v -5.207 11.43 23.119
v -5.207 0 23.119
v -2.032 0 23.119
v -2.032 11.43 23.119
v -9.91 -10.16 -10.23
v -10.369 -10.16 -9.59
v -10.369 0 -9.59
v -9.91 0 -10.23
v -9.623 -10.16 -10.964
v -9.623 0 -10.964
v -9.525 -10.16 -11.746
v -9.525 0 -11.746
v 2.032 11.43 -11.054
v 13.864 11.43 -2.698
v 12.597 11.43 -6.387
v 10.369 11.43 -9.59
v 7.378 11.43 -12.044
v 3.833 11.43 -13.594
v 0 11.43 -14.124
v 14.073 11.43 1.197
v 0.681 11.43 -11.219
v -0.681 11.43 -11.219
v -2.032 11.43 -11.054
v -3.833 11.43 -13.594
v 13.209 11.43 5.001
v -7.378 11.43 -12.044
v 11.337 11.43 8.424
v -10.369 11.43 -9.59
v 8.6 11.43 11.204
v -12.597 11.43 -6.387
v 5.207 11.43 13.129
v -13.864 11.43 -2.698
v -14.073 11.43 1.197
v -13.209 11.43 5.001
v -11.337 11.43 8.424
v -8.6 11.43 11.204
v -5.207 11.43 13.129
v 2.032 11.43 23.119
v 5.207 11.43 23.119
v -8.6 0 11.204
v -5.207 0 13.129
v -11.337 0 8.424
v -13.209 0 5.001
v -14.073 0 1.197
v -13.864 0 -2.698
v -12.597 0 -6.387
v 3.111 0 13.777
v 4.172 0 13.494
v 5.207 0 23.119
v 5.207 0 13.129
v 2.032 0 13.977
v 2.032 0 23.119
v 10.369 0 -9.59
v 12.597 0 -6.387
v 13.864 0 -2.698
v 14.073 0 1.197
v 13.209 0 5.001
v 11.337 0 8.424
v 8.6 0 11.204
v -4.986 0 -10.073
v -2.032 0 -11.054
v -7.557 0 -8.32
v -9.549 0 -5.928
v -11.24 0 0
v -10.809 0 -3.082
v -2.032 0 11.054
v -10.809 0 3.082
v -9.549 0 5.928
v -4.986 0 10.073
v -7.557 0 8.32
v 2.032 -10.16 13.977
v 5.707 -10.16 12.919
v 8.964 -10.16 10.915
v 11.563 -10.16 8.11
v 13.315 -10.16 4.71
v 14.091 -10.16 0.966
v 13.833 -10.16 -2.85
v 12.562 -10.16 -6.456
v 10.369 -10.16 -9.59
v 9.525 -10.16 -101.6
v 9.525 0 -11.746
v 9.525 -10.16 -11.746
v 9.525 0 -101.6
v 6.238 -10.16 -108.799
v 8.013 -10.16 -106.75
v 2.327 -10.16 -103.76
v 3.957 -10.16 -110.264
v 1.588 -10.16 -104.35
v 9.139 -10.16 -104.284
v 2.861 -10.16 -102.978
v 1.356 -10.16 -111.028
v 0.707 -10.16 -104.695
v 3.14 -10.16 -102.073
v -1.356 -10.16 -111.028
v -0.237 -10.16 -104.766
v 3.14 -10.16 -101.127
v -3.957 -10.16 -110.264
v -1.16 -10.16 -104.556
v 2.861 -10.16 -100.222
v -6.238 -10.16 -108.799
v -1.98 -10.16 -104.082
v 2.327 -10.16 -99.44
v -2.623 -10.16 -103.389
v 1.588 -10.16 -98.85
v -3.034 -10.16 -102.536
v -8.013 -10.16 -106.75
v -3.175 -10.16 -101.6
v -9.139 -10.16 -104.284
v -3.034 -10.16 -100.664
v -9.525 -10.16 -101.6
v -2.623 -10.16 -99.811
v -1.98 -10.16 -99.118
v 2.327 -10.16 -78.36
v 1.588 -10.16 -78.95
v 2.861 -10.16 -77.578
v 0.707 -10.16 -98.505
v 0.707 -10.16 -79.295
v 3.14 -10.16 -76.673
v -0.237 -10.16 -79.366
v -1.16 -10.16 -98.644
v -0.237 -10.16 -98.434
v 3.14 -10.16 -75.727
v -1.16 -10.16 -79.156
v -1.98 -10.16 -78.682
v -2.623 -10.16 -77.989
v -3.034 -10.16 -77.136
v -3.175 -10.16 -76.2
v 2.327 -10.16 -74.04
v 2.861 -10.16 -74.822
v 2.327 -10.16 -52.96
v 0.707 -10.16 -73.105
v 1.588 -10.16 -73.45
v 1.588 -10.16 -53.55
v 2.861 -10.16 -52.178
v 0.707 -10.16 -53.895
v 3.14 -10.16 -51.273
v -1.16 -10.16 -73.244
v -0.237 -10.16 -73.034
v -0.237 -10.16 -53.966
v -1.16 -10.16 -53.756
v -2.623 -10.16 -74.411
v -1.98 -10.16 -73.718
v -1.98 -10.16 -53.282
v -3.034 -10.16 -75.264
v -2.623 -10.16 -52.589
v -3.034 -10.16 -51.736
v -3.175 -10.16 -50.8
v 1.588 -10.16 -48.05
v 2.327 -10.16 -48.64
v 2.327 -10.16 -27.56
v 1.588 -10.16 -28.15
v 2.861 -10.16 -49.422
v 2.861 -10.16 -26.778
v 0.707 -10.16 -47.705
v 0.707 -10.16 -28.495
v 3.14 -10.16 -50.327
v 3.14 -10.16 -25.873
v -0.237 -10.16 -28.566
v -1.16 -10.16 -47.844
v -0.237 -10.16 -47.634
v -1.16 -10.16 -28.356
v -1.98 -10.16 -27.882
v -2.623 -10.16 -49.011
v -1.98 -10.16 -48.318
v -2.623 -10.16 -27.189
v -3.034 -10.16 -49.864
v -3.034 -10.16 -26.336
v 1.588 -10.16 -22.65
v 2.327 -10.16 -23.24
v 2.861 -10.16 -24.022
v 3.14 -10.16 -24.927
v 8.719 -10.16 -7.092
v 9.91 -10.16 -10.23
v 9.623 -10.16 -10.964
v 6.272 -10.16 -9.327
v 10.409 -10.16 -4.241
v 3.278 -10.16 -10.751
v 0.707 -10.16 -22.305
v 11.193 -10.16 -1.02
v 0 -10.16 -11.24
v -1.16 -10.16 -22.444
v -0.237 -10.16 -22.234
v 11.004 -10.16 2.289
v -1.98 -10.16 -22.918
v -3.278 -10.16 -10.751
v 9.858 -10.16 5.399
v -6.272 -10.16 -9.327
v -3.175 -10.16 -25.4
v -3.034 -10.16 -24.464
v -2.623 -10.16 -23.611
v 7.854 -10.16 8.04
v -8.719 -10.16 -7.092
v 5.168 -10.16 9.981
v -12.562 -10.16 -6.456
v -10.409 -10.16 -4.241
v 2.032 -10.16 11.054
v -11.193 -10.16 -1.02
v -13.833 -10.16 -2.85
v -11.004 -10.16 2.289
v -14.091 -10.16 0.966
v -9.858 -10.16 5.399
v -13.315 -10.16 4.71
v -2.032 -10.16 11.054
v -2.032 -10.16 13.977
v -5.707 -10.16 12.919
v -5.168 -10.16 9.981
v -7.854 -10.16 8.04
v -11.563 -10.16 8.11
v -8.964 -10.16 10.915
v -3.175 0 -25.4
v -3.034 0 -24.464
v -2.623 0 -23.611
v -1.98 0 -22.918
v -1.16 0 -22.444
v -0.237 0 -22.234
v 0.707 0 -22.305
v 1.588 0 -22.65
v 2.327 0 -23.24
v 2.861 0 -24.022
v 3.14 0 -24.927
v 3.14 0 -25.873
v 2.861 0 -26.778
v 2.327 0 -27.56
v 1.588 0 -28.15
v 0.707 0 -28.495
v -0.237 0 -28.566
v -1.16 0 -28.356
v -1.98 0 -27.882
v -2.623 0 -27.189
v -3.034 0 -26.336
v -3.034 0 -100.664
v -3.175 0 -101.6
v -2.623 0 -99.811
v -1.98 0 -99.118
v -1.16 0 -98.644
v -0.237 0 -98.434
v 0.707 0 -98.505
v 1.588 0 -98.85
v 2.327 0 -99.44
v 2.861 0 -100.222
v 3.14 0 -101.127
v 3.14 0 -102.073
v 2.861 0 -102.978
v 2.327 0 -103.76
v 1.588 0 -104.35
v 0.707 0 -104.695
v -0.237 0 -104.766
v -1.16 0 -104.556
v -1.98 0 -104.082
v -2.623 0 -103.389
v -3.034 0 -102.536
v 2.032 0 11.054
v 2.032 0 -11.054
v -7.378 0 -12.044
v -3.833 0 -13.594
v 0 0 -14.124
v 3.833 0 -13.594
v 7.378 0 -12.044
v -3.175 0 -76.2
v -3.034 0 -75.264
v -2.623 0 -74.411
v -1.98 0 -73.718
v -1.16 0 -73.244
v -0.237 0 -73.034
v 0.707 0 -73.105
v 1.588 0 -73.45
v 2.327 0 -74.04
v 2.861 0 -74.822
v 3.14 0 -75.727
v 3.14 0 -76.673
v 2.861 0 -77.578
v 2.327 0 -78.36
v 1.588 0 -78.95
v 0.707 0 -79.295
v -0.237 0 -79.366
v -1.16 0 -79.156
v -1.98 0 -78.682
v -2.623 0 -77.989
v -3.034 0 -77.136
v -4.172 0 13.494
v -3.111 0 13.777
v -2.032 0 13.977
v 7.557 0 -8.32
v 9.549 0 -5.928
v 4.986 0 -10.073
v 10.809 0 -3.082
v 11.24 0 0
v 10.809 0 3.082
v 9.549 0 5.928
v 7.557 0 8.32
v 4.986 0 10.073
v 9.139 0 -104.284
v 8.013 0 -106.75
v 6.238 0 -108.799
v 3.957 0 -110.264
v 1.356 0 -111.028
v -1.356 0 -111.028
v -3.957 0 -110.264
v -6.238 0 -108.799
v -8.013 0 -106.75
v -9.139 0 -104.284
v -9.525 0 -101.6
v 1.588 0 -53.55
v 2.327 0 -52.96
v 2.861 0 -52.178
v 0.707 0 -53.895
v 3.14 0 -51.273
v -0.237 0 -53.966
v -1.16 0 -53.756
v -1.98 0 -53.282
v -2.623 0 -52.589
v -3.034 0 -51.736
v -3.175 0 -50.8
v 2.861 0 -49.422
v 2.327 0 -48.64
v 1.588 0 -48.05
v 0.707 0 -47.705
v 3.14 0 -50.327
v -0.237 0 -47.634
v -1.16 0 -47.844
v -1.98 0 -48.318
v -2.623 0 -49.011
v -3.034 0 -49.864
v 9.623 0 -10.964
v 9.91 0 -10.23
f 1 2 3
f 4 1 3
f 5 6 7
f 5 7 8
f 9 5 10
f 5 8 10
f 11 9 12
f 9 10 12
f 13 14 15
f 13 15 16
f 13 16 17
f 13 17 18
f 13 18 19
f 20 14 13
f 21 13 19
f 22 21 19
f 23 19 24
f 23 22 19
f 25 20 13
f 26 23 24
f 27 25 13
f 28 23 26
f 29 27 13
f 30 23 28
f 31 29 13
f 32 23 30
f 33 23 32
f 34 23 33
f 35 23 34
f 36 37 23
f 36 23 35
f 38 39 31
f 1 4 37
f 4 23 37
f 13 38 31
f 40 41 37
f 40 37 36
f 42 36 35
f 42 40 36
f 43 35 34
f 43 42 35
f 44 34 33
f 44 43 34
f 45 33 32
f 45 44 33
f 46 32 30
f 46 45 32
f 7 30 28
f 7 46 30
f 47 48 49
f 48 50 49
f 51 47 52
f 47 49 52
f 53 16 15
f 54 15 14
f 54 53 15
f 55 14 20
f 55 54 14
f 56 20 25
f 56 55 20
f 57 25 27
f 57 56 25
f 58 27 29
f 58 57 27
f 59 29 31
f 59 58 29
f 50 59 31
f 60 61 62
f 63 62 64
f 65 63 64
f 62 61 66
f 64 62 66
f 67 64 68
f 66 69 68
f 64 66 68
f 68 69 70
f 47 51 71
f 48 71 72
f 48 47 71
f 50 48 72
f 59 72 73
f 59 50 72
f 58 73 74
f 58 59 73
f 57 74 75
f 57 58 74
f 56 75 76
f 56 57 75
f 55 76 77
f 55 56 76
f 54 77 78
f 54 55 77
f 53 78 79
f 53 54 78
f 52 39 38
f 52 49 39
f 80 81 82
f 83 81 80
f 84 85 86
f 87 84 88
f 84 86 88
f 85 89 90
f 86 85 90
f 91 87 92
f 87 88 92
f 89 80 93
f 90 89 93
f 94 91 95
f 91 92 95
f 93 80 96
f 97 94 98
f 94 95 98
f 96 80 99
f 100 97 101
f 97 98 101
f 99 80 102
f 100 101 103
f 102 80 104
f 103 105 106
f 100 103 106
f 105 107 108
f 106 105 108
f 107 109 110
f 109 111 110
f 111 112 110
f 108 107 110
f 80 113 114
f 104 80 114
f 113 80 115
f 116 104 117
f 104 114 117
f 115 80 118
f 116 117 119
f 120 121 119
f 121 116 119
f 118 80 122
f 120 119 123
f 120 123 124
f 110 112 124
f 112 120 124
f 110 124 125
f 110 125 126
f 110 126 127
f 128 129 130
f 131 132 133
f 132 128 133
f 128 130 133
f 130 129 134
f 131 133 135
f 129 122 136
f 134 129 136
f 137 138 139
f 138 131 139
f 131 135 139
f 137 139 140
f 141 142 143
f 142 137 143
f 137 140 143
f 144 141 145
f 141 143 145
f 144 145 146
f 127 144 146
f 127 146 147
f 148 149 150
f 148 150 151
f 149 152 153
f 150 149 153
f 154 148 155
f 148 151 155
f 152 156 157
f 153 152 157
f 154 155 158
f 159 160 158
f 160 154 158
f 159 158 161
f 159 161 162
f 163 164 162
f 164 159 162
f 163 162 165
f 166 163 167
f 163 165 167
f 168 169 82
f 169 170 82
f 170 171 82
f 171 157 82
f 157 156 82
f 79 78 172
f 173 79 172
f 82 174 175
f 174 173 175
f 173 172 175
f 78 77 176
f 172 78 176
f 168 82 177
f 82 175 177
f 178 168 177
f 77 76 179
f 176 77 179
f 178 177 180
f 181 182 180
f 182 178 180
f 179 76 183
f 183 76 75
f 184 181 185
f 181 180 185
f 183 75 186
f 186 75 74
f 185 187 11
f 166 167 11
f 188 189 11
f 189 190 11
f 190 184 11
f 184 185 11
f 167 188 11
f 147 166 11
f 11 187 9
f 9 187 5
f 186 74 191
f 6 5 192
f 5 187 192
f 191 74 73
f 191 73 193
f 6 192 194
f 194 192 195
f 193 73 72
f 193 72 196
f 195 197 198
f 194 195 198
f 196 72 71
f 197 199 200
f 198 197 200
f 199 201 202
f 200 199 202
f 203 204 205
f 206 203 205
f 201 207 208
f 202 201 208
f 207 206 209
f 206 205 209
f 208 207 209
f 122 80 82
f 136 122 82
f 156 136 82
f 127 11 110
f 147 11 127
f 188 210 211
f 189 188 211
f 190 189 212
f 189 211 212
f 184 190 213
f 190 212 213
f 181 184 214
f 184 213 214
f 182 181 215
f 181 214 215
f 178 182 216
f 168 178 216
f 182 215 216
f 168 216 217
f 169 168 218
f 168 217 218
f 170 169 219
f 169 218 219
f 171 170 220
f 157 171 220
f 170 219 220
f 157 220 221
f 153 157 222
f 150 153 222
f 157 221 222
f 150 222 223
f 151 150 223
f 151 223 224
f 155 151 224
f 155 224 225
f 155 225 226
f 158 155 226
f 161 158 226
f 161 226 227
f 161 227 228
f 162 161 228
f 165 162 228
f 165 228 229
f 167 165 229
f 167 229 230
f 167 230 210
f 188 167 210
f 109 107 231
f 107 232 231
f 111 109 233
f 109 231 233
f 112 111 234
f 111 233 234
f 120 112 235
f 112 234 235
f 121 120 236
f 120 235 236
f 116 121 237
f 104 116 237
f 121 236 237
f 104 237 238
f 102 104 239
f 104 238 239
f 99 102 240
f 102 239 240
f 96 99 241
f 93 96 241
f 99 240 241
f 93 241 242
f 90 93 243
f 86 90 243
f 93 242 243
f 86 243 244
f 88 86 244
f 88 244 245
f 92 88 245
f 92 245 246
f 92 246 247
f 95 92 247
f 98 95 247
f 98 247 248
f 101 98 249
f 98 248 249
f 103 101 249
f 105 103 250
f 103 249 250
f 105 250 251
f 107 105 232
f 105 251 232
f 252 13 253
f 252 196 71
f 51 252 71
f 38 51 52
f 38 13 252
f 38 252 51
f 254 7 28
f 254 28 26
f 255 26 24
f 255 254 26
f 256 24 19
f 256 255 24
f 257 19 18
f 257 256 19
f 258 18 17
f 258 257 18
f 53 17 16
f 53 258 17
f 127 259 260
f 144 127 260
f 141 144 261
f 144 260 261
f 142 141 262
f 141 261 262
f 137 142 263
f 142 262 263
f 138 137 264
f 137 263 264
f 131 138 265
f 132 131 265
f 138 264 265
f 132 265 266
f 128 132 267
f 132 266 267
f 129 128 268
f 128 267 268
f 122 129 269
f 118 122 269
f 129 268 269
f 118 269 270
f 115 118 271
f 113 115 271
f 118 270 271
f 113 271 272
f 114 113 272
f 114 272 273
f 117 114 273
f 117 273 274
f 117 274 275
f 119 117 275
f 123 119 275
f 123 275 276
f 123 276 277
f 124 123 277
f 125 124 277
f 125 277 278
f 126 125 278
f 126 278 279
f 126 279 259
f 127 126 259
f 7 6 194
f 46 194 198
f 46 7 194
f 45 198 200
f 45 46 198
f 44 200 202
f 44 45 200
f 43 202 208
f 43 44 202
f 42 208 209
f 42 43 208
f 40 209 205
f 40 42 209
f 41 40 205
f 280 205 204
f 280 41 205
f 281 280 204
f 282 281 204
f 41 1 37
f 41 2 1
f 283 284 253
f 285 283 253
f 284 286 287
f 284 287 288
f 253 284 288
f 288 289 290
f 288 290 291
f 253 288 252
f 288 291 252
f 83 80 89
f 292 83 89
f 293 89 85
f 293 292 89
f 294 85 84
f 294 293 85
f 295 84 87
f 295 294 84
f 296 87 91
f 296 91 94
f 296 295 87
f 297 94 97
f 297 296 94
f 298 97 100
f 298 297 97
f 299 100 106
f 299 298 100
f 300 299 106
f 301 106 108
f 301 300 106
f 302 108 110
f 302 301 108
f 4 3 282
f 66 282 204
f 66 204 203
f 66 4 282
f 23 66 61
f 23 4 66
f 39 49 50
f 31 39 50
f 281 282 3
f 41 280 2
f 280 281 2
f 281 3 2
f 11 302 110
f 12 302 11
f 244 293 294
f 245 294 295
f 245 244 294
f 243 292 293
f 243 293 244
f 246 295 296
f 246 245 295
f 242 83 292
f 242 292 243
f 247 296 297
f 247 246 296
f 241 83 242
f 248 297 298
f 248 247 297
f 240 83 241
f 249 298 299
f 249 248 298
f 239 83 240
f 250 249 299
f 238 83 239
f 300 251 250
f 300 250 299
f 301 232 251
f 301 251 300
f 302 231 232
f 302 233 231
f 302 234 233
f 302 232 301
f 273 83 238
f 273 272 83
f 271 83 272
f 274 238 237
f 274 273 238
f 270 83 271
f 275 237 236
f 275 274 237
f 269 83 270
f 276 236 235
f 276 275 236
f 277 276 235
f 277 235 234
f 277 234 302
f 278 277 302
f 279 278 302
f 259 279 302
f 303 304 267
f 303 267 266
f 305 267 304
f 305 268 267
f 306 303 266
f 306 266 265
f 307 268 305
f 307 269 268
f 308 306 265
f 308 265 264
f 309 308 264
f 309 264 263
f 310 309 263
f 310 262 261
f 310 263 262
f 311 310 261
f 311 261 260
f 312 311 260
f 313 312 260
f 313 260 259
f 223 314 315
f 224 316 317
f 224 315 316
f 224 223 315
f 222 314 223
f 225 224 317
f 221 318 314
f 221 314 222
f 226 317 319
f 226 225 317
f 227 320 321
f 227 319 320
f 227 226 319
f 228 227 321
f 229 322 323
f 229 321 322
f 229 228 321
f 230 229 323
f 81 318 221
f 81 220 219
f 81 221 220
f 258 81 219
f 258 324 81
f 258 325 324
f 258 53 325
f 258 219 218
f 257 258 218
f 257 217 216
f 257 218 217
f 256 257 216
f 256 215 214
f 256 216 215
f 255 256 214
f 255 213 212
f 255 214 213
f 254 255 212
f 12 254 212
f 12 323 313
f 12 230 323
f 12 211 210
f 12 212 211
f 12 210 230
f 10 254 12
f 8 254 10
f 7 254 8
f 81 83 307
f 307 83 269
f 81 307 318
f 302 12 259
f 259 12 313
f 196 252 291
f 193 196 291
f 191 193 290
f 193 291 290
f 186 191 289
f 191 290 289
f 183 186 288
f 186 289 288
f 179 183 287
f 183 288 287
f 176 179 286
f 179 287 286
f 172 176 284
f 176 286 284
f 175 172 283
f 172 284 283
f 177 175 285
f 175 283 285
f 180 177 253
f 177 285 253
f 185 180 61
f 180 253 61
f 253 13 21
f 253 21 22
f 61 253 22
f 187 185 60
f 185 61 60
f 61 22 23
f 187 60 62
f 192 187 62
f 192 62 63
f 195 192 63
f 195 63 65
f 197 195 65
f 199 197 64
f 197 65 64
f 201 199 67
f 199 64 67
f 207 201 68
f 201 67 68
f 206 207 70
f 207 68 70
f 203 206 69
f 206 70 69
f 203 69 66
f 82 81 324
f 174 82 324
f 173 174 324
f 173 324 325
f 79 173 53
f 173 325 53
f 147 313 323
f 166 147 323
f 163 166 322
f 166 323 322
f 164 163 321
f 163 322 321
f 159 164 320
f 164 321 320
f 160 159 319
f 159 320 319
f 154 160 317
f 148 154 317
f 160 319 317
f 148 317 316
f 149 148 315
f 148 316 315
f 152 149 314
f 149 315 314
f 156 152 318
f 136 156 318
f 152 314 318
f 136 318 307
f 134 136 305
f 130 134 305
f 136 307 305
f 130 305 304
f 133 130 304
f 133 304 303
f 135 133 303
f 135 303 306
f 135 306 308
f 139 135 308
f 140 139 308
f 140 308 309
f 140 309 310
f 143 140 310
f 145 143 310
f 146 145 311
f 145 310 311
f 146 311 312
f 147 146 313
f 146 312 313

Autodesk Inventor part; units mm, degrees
ref_plane "YZ Plane" through (0, 0, 0) normal (1, 0, 0) x (0, 1, 0)
ref_plane "XZ Plane" through (0, 0, 0) normal (0, 1, 0) x (-1, 0, 0)
ref_plane "XY Plane" through (0, 0, 0) normal (0, 0, 1) x (1, 0, 0)
sketch "Sketch1" plane through (0, 0, 0) normal (0, 1, 0) x (-1, 0, 0)
  arc A0 (-2.032, 11.0543) -> (2.032, 11.0543) centre (0, 0) ccw
  circle A1 centre (0, -25.4) radius 3.175
  circle A2 centre (0, -50.8) radius 3.175
  circle A3 centre (0, -76.2) radius 3.175
  circle A4 centre (0, -101.6) radius 3.175
  arc A5 (-9.525, -101.6) -> (9.525, -101.6) centre (0, -101.6) ccw
  line L0 (9.525, -101.6) -> (9.525, -11.7455)
  line L1 (-9.525, -11.7455) -> (-9.525, -101.6)
  arc A6 (10.369, -9.5897) -> (9.525, -11.7455) centre (12.7, -11.7455) ccw
  arc A7 (-9.525, -11.7455) -> (-10.369, -9.5897) centre (-12.7, -11.7455) ccw
  line L2 (-2.032, 11.0543) -> (-2.032, 13.9768)
  line L3 (2.032, 13.9768) -> (2.032, 11.0543)
  arc A8 (10.369, -9.5897) -> (2.032, 13.9768) centre (0, 0) ccw
  arc A9 (-2.032, 13.9768) -> (-10.369, -9.5897) centre (0, 0) ccw
  line L4 (-2.032, 11.0543) -> (-2.032, 23.1193)
  line L5 (-5.207, 23.1193) -> (-2.032, 23.1193)
  line L6 (-2.032, 23.1193) -> (-5.207, 23.1193)
  line L7 (-5.207, 23.1193) -> (-5.207, -13.1289)
  line L8 (-2.032, 23.1193) -> (-2.032, -13.9768)
  circle A10 centre (0, 0) radius 14.1237
  line L9 (0, 0) -> (0, -11.2395)
  line L10 (2.032, 11.0543) -> (2.032, 23.1193)
  line L11 (5.207, 23.1193) -> (2.032, 23.1193)
  line L12 (2.032, 23.1193) -> (5.207, 23.1193)
  line L13 (5.207, 23.1193) -> (5.207, -13.1289)
  line L14 (2.032, 23.1193) -> (2.032, -13.9768)
  point P0 (9.525, -10.4285)
  point P1 (-9.525, -10.4285)
  point P2 (-5.207, -9.9606)
  point P3 (-2.032, -11.0543)
  point P4 (5.207, -9.9606)
  point P5 (2.032, -11.0543)
  point P6 (5.207, 13.1289)
  point P7 (5.207, 9.9606)
  point P8 (-5.207, 9.9606)
  point P9 (-5.207, 13.1289)
  point P10 (2.032, 11.0543)
  point P11 (2.032, -11.0543)
  dimension "d9" = 6.35
  dimension "d10" = 6.35
  dimension "d11" = 6.35
  dimension "d12" = 3.175
  dimension "d15" = 12.065
  dimension "d16" = 3.175
extrude "Extrusion1" add sketch "Sketch1" against normal blind 10.16 contours A0 L7 A9 L2 | A0 L7 A10 A9 | L8 A10 L7 A0 | A0 L14 A10 L8 | A8 L13 A0 L3 | A10 A6 L0 A5 L1 A7 | A8 A10 L13 A0 | A0 L13 A10 L14
extrude "Extrusion2" add sketch "Sketch1" along normal blind 11.43 contours L8 A0 L7 | A0 L7 A9 L2 | A9 L7 L5 L4 | L8 A10 L7 A0 | A8 L13 A0 L3 | L10 L11 L13 A8 | A0 L13 L14 | A0 L13 A10 L14
extrude "Extrusion3" add sketch "Sketch1" along normal blind 11.43 contours L7 A0 | A0 L7 A10 A9 | A0 L14 A10 L8 | A8 A10 L13 A0 | A0 L13
properties part number "Torque Test Valve Lever"
